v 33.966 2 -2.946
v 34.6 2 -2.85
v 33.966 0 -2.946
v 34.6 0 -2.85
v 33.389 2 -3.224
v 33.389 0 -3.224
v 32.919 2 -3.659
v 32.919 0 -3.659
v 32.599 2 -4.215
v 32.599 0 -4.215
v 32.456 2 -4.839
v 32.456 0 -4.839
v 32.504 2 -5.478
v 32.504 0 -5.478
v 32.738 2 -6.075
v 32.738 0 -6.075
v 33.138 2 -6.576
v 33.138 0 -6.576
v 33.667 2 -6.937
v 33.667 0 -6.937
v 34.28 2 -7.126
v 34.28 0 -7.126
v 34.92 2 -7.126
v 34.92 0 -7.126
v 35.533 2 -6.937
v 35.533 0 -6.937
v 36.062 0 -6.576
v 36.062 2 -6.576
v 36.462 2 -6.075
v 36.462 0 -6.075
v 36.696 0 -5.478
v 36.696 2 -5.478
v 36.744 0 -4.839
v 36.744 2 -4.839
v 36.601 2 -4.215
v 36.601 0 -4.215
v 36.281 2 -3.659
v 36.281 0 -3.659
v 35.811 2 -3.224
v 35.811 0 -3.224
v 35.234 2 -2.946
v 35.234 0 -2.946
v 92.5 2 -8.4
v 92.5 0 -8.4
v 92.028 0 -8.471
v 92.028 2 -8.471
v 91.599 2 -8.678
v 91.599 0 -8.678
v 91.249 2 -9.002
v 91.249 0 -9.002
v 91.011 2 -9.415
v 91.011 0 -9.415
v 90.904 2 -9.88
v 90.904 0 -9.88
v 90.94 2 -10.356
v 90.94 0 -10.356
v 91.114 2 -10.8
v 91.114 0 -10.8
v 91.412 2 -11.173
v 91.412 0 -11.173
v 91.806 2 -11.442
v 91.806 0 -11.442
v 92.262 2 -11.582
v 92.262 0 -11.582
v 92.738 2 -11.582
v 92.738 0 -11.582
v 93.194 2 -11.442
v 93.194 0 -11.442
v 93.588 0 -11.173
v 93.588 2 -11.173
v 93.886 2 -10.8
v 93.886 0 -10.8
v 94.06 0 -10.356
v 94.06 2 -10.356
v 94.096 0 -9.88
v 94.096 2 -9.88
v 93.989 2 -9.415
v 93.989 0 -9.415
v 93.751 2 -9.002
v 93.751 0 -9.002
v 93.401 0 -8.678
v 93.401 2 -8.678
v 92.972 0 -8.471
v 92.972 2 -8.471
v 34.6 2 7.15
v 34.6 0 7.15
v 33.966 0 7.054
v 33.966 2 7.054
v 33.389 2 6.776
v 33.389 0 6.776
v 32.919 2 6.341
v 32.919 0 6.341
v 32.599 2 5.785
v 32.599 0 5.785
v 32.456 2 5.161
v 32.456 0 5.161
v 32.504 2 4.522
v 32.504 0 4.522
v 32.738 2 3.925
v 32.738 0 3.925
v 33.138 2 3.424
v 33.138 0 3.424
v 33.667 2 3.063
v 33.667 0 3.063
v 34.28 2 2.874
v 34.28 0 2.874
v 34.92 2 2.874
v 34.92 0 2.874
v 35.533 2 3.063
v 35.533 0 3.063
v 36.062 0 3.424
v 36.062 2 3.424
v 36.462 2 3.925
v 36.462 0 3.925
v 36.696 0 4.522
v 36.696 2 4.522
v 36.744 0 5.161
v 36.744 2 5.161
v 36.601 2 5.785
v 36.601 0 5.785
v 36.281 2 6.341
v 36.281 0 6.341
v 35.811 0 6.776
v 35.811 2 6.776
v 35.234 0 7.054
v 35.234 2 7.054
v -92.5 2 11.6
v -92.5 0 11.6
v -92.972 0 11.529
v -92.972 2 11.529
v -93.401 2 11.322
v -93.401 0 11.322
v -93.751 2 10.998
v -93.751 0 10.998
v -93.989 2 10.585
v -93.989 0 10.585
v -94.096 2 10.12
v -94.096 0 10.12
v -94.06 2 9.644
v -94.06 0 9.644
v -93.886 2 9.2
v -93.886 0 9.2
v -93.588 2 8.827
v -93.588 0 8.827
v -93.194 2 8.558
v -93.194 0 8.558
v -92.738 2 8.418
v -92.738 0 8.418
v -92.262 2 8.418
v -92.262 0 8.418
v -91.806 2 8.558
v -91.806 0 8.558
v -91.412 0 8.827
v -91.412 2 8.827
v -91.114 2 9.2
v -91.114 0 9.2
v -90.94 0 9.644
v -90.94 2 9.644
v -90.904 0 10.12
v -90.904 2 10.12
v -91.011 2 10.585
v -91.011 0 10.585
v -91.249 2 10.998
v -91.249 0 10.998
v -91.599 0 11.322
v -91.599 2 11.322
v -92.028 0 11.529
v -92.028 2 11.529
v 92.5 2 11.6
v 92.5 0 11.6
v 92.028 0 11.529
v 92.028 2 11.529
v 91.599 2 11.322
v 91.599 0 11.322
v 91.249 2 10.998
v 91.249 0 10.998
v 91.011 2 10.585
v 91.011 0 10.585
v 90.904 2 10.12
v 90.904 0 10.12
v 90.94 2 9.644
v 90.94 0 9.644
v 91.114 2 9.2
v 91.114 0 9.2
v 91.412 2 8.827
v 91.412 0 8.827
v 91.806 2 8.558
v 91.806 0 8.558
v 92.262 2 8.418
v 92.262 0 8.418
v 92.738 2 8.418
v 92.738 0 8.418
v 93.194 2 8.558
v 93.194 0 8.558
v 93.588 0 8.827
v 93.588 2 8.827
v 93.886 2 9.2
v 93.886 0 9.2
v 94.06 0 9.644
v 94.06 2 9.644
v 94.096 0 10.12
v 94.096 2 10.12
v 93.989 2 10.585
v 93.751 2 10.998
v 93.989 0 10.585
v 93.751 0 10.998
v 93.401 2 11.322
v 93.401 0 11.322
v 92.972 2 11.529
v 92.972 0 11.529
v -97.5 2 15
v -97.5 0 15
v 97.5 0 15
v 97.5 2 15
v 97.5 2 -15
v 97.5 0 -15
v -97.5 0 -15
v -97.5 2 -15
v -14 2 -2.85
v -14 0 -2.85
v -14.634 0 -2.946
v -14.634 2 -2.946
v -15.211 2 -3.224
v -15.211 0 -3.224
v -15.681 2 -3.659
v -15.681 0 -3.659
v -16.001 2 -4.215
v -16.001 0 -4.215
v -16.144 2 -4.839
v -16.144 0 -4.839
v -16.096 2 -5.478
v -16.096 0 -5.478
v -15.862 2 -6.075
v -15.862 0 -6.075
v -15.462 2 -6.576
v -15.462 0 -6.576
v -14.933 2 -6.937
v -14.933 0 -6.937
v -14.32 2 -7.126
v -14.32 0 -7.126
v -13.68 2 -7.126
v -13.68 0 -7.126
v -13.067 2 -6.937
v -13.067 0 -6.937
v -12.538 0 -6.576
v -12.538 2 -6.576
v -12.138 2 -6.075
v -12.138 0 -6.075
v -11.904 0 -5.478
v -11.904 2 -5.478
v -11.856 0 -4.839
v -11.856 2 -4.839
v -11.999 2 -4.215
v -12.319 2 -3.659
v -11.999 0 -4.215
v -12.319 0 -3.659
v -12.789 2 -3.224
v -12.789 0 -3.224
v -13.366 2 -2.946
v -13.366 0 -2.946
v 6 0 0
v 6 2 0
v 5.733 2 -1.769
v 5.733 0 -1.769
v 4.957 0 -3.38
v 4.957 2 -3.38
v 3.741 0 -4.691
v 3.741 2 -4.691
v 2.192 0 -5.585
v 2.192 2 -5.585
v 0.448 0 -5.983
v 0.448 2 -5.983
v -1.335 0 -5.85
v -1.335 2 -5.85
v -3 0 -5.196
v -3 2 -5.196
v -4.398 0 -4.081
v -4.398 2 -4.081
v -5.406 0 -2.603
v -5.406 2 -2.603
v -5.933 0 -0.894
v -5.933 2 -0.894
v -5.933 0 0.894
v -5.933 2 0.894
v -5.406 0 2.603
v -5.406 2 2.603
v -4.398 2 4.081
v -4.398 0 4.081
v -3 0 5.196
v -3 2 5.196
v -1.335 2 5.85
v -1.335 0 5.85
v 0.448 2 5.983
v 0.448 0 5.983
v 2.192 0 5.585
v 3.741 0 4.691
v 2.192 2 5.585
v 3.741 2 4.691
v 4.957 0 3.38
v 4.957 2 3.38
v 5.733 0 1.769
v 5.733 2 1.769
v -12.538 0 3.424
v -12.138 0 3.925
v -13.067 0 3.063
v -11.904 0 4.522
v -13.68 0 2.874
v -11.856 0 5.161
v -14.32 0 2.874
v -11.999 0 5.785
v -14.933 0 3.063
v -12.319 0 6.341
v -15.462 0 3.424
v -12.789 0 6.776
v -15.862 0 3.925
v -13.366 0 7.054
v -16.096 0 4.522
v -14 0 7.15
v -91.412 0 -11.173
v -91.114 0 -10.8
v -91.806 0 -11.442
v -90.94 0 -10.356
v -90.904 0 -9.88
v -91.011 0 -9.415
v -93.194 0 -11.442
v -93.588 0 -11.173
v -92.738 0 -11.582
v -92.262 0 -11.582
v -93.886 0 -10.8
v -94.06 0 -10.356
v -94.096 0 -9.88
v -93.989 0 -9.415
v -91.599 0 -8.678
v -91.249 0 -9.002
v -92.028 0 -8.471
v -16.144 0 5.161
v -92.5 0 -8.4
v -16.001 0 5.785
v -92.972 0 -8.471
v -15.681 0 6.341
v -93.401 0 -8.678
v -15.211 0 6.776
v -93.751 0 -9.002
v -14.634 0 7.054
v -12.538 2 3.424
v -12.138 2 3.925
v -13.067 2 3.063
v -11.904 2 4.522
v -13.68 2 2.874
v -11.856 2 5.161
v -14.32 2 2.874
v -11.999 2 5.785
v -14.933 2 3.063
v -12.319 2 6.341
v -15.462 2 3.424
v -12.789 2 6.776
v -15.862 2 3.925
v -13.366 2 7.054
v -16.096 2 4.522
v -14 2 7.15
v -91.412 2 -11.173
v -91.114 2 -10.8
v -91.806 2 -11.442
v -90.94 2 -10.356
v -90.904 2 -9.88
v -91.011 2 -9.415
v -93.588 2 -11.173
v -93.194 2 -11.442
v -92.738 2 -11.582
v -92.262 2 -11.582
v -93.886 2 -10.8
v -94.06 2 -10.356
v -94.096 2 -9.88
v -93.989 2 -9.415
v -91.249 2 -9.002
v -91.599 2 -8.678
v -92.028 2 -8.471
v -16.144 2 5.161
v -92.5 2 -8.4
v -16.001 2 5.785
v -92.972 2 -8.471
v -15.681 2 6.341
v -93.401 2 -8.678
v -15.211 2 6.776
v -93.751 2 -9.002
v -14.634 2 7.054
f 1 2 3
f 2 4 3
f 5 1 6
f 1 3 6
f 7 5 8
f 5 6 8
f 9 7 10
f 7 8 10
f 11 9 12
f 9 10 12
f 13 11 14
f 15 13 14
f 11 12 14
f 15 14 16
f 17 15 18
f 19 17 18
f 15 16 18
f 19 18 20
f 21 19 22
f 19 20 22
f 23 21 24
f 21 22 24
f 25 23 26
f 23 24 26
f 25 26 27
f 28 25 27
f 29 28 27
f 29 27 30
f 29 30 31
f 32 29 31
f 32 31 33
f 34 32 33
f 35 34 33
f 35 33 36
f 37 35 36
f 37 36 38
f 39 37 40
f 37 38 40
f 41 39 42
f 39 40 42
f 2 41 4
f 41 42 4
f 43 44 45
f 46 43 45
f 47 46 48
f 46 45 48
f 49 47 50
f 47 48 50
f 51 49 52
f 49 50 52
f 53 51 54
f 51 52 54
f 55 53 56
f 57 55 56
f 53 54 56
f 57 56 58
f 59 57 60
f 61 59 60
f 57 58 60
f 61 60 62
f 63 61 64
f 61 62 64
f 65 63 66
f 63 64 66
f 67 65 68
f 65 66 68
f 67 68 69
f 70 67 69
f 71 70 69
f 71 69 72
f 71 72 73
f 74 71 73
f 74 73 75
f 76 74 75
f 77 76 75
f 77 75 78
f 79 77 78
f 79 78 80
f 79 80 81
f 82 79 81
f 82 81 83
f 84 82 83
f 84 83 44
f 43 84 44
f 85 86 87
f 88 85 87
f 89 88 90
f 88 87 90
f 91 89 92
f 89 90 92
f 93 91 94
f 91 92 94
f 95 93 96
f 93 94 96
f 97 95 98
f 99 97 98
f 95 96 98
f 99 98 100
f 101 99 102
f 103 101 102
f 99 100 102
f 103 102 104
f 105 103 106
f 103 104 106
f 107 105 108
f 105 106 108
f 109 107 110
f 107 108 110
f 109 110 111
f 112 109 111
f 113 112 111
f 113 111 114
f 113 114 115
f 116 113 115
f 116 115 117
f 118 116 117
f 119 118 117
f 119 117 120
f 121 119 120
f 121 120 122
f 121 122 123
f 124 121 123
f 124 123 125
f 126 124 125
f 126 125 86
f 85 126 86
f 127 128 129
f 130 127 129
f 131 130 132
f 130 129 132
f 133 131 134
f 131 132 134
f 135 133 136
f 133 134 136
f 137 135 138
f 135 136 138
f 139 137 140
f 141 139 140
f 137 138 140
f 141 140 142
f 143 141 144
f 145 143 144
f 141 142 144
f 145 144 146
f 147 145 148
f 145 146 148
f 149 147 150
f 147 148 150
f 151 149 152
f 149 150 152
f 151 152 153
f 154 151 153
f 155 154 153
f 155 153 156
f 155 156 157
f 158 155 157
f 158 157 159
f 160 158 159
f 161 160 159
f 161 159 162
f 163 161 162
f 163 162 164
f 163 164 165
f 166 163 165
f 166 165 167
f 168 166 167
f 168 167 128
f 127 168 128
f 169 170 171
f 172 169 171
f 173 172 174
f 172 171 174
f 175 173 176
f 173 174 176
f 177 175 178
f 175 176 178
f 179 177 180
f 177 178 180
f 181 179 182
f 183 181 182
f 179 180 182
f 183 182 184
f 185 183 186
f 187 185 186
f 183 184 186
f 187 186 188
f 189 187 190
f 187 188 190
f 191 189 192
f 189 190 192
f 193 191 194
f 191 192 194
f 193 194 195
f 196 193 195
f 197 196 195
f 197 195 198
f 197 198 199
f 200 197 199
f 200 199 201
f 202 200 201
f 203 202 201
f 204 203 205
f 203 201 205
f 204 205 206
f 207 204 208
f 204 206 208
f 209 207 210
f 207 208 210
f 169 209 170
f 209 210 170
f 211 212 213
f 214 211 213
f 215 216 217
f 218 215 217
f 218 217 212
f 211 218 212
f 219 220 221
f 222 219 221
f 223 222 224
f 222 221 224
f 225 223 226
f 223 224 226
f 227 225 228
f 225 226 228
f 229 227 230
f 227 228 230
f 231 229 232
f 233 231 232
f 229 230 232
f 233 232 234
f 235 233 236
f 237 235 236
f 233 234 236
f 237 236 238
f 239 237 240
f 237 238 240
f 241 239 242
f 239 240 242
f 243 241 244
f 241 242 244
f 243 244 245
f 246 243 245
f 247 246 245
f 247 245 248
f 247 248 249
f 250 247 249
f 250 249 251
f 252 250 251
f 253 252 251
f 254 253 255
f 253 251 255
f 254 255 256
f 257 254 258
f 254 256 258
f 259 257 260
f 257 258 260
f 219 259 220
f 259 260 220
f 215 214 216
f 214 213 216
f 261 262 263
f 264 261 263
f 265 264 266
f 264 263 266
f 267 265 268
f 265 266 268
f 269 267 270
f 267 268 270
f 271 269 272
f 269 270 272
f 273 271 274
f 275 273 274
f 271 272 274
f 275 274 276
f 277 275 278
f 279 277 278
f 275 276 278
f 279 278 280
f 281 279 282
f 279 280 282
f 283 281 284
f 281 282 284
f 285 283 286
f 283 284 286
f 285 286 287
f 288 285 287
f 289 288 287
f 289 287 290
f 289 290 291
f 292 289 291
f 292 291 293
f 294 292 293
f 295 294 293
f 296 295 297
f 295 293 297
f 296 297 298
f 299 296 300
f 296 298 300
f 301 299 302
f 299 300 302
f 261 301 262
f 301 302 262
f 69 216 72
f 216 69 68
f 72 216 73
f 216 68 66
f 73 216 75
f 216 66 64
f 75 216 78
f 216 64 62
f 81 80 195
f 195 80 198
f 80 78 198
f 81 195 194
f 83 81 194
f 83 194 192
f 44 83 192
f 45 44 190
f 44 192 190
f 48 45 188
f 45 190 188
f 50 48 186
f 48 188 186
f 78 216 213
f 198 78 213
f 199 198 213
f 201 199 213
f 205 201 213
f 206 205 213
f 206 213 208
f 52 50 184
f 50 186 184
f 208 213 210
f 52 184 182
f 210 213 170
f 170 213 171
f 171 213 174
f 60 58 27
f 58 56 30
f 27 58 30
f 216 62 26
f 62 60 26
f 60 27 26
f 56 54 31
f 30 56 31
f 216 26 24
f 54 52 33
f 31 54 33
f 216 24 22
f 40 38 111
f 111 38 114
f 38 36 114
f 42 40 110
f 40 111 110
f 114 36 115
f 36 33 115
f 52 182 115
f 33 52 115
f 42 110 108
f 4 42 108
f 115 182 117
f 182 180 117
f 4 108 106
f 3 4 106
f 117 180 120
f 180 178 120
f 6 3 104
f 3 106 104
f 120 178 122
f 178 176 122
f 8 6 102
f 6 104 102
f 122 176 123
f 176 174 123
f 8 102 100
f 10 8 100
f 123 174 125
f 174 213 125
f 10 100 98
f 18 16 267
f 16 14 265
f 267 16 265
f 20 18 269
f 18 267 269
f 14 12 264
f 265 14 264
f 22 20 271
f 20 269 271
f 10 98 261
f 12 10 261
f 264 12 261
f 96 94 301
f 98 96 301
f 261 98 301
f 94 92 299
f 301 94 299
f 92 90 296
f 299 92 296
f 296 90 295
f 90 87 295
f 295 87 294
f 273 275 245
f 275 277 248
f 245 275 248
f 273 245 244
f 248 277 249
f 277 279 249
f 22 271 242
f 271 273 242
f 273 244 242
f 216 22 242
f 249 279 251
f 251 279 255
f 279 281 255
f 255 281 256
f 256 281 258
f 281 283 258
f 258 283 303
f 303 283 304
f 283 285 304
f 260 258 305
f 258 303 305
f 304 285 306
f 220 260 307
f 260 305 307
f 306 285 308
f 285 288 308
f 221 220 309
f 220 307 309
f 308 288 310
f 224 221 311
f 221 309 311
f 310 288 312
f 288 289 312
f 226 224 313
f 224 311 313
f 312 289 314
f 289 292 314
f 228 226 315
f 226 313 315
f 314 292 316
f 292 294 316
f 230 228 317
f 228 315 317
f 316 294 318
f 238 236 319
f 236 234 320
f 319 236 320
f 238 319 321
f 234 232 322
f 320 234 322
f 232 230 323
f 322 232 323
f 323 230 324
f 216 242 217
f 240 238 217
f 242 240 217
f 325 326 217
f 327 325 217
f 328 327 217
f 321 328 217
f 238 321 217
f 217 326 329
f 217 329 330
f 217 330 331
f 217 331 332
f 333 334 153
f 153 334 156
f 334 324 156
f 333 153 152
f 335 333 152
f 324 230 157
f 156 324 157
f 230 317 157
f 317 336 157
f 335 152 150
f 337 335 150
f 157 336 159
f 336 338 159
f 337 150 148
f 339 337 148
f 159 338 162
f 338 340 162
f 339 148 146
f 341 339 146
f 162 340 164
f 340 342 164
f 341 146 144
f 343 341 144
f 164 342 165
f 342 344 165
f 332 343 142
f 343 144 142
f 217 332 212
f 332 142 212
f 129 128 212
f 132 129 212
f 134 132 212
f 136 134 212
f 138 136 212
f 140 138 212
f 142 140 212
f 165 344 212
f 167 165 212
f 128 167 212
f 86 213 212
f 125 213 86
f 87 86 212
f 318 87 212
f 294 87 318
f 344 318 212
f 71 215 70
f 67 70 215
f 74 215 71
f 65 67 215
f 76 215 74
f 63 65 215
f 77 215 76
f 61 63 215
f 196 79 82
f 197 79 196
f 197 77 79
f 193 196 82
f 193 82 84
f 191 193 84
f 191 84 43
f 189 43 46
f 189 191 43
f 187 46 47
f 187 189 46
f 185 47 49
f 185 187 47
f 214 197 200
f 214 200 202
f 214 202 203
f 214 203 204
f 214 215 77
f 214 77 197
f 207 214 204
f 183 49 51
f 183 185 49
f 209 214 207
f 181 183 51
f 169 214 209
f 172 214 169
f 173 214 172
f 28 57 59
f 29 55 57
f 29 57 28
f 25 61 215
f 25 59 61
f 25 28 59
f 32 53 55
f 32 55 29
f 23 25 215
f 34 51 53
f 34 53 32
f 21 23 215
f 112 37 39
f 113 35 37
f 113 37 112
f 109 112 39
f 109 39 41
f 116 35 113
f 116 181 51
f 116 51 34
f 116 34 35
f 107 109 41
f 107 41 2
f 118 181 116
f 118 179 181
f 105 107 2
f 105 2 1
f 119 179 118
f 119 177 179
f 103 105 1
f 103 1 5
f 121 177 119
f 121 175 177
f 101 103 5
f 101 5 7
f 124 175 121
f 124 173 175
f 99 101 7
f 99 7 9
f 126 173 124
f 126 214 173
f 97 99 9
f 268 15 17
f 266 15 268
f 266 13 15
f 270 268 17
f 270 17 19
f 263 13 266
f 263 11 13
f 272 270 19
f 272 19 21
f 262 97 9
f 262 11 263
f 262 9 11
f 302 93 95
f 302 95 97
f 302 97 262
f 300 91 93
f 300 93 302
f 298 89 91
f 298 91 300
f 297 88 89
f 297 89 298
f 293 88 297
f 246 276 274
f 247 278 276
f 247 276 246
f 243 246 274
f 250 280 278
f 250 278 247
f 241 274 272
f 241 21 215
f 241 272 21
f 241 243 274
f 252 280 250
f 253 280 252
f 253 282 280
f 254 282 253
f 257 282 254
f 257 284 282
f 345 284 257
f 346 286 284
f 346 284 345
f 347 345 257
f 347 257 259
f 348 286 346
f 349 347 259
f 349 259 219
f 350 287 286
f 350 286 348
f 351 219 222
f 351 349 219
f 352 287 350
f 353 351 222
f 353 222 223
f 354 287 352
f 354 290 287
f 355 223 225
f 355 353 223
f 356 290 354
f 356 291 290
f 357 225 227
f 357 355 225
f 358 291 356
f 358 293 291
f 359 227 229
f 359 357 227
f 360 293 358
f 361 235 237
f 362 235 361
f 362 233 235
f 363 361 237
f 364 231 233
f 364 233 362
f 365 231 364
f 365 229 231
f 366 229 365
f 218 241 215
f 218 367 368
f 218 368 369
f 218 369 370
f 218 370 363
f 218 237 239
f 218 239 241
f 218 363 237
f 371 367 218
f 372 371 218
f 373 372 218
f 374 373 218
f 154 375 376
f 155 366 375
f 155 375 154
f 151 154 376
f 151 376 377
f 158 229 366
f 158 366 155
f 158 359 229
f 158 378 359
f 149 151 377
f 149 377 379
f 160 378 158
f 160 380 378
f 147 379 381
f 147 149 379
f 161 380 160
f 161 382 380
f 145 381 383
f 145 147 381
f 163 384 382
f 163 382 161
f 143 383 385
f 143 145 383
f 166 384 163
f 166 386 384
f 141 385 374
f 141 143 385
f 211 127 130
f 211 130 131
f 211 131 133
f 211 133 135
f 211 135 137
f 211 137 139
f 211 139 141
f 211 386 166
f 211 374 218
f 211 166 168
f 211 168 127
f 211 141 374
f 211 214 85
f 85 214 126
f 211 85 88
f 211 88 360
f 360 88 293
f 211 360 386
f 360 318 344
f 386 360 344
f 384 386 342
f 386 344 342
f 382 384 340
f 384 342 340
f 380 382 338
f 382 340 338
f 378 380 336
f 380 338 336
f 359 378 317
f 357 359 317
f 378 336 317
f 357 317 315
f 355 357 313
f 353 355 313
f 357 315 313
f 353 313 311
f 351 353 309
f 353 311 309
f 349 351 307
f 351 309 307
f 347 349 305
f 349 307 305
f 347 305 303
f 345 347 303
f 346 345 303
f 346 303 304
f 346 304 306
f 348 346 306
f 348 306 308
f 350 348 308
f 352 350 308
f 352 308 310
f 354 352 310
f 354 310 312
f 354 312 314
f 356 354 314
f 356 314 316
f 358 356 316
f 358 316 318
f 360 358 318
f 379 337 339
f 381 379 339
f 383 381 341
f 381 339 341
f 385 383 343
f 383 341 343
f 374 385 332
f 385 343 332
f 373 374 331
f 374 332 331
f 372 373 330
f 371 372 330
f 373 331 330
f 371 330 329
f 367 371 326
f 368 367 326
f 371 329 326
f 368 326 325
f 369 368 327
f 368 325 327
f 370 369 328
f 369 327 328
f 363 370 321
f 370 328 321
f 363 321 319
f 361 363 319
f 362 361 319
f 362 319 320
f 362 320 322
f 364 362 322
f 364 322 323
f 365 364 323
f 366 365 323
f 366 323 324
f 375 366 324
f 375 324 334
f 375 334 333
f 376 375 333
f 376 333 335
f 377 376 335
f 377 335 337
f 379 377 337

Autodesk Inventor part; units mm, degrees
ref_plane "YZ Plane" through (0, 0, 0) normal (1, 0, 0) x (0, 1, 0)
ref_plane "XZ Plane" through (0, 0, 0) normal (0, 1, 0) x (-1, 0, 0)
ref_plane "XY Plane" through (0, 0, 0) normal (0, 0, 1) x (1, 0, 0)
sketch "スケッチ1" plane through (0, 0, 0) normal (0, 1, 0) x (-1, 0, 0)
  line L0 (97.5, 15) -> (-97.5, 15)
  line L1 (-97.5, 15) -> (-97.5, -15)
  line L2 (-97.5, -15) -> (97.5, -15)
  line L3 (97.5, -15) -> (97.5, 15)
  line L4 (97.5, 15) -> (-97.5, -15) construction
  line L5 (-97.5, 15) -> (97.5, -15) construction
  point P0 (0, 0)
  dimension "d0" = 195
  dimension "d1" = 30
extrude "プレート1" add sketch "スケッチ1" along normal blind 2
sketch "スケッチ2" plane through (0, 2, 0) normal (0, 1, 0) x (1, 0, 0)
  line L0 (-14, -5) -> (34.6, -5)
  line L1 (34.6, -5) -> (34.6, 5)
  line L2 (34.6, 5) -> (-14, 5)
  line L3 (-14, 5) -> (-14, -5)
  line L4 (-14, -5) -> (34.6, 5) construction
  line L5 (34.6, -5) -> (-14, 5) construction
  point P0 (0, 0)
  point P1 (10.3, 0)
  point P2 (10.3, 0)
  dimension "d3" = 48.6
  dimension "d4" = 14
  dimension "d5" = 10
hole "穴1" at (34.6, 2, -5) at (34.6, 2, 5) at (-14, 2, -5) at (-14, 2, 5) direction (0, -1, 0) diameter 4.3 end through all clearance for "Socket Head Cap Screw" size "M4" standard "Ansi Metric M Profile"
sketch "スケッチ3" plane through (0, 2, 0) normal (0, 1, 0) x (1, 0, 0)
  circle A0 centre (0, 0) radius 6
  dimension "d13" = 12
extrude "押し出し1" cut sketch "スケッチ3" against normal through all
sketch "スケッチ4" plane through (0, 2, 0) normal (0, 1, 0) x (1, 0, 0)
  line L0 (97.5, 15) -> (97.5, -15) projected
  line L1 (-97.5, 15) -> (97.5, 15) projected
  line L2 (97.5, -15) -> (-97.5, -15) projected
  line L3 (-97.5, -15) -> (-97.5, 15) projected
  point P0 (0, 0)
  point P1 (-92.5, 10)
  point P2 (-92.5, -10)
  point P3 (92.5, 10)
  point P4 (92.5, -10)
  dimension "d16" = 5
  dimension "d17" = 5
  dimension "d18" = 5
  dimension "d19" = 5
hole "穴2" at (-92.5, 2, -10) at (-92.5, 2, 10) at (92.5, 2, -10) at (92.5, 2, 10) direction (0, -1, 0) diameter 3.2 end through all clearance for "Socket Head Cap Screw" size "M3" standard "Ansi Metric M Profile"
equation "\"d11\" = Thickness"
equation "\"d25\" = Thickness"
equation "\"d2\" = Thickness"
equation "\"BendRadius\" = Thickness"
equation "\"BendReliefWidth\" = Thickness"
equation "\"BendReliefDepth\" = 0.5 * Thickness"
equation "\"CornerReliefSize\" = 4 * Thickness"
equation "\"MinimumRemnant\" = 2 * Thickness"
equation "\"TransitionRadius\" = BendRadius"
equation "\"JacobiRadiusSize\" = BendRadius"
equation "\"GapSize\" = Thickness"
equation "\"Thickness\" = 2"
properties part number "s_carbon_plate3"
